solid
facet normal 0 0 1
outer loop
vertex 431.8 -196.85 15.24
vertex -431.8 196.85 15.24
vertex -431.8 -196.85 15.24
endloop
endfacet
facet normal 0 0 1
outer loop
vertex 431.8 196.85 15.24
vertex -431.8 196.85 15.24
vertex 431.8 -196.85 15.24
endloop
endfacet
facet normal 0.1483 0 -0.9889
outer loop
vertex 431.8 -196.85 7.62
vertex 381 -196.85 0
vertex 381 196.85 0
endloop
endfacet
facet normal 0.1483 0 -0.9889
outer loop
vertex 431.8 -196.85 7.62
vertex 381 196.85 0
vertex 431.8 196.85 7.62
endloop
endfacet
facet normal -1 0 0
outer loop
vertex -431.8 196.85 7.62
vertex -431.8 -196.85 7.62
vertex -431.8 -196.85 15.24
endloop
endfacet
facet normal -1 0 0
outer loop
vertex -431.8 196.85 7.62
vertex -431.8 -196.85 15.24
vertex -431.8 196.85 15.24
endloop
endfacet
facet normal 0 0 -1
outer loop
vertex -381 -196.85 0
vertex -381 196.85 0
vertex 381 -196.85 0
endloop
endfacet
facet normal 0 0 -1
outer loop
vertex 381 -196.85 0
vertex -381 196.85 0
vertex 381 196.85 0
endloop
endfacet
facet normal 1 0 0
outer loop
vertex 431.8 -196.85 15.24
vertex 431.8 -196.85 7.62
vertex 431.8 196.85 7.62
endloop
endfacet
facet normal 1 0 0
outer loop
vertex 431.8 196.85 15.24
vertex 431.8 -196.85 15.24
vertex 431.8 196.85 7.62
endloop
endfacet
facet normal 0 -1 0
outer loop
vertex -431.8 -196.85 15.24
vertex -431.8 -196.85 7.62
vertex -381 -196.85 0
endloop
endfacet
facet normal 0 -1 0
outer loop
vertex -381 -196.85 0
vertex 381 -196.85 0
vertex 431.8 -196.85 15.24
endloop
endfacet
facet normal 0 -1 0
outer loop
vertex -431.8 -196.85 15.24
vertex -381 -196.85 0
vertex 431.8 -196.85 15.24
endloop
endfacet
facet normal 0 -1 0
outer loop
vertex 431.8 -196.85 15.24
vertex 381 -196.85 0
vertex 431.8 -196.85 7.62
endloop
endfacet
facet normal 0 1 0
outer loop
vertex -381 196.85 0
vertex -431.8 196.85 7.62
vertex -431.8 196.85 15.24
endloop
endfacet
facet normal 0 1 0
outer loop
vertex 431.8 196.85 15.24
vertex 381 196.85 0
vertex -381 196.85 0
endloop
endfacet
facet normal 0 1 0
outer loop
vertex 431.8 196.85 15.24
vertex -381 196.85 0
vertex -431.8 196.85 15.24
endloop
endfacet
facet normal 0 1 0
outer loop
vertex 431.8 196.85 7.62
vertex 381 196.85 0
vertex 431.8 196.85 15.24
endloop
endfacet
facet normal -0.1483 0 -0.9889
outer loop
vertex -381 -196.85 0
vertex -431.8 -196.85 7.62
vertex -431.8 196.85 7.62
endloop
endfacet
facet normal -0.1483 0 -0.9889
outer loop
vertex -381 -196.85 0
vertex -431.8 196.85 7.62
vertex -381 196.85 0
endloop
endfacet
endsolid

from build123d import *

# Parameters (mm, degrees)
F0_W     = 863.6
F0_H     = 393.7
F1_DEPTH = 15.24
F3_DEPTH = 393.701


with BuildPart() as f1:
    # F0 (on Top) → F1 (new body)
    with BuildSketch(Plane.XY):
        Rectangle(F0_W, F0_H)
    extrude(amount=F1_DEPTH)

    # F2 (on face) → F3 (cut, through all)
    with BuildSketch(Plane(origin=(0, 196.85, 0), x_dir=(-1, 0, 0), z_dir=(0, 1, 0))):
        Polygon((-381, 0), (-431.8, 7.62), (-431.8, 0), align=None)
        Polygon((431.8, 7.62), (381, 0), (431.8, 0), align=None)
    extrude(amount=-F3_DEPTH, mode=Mode.SUBTRACT)


solid = f1.part
